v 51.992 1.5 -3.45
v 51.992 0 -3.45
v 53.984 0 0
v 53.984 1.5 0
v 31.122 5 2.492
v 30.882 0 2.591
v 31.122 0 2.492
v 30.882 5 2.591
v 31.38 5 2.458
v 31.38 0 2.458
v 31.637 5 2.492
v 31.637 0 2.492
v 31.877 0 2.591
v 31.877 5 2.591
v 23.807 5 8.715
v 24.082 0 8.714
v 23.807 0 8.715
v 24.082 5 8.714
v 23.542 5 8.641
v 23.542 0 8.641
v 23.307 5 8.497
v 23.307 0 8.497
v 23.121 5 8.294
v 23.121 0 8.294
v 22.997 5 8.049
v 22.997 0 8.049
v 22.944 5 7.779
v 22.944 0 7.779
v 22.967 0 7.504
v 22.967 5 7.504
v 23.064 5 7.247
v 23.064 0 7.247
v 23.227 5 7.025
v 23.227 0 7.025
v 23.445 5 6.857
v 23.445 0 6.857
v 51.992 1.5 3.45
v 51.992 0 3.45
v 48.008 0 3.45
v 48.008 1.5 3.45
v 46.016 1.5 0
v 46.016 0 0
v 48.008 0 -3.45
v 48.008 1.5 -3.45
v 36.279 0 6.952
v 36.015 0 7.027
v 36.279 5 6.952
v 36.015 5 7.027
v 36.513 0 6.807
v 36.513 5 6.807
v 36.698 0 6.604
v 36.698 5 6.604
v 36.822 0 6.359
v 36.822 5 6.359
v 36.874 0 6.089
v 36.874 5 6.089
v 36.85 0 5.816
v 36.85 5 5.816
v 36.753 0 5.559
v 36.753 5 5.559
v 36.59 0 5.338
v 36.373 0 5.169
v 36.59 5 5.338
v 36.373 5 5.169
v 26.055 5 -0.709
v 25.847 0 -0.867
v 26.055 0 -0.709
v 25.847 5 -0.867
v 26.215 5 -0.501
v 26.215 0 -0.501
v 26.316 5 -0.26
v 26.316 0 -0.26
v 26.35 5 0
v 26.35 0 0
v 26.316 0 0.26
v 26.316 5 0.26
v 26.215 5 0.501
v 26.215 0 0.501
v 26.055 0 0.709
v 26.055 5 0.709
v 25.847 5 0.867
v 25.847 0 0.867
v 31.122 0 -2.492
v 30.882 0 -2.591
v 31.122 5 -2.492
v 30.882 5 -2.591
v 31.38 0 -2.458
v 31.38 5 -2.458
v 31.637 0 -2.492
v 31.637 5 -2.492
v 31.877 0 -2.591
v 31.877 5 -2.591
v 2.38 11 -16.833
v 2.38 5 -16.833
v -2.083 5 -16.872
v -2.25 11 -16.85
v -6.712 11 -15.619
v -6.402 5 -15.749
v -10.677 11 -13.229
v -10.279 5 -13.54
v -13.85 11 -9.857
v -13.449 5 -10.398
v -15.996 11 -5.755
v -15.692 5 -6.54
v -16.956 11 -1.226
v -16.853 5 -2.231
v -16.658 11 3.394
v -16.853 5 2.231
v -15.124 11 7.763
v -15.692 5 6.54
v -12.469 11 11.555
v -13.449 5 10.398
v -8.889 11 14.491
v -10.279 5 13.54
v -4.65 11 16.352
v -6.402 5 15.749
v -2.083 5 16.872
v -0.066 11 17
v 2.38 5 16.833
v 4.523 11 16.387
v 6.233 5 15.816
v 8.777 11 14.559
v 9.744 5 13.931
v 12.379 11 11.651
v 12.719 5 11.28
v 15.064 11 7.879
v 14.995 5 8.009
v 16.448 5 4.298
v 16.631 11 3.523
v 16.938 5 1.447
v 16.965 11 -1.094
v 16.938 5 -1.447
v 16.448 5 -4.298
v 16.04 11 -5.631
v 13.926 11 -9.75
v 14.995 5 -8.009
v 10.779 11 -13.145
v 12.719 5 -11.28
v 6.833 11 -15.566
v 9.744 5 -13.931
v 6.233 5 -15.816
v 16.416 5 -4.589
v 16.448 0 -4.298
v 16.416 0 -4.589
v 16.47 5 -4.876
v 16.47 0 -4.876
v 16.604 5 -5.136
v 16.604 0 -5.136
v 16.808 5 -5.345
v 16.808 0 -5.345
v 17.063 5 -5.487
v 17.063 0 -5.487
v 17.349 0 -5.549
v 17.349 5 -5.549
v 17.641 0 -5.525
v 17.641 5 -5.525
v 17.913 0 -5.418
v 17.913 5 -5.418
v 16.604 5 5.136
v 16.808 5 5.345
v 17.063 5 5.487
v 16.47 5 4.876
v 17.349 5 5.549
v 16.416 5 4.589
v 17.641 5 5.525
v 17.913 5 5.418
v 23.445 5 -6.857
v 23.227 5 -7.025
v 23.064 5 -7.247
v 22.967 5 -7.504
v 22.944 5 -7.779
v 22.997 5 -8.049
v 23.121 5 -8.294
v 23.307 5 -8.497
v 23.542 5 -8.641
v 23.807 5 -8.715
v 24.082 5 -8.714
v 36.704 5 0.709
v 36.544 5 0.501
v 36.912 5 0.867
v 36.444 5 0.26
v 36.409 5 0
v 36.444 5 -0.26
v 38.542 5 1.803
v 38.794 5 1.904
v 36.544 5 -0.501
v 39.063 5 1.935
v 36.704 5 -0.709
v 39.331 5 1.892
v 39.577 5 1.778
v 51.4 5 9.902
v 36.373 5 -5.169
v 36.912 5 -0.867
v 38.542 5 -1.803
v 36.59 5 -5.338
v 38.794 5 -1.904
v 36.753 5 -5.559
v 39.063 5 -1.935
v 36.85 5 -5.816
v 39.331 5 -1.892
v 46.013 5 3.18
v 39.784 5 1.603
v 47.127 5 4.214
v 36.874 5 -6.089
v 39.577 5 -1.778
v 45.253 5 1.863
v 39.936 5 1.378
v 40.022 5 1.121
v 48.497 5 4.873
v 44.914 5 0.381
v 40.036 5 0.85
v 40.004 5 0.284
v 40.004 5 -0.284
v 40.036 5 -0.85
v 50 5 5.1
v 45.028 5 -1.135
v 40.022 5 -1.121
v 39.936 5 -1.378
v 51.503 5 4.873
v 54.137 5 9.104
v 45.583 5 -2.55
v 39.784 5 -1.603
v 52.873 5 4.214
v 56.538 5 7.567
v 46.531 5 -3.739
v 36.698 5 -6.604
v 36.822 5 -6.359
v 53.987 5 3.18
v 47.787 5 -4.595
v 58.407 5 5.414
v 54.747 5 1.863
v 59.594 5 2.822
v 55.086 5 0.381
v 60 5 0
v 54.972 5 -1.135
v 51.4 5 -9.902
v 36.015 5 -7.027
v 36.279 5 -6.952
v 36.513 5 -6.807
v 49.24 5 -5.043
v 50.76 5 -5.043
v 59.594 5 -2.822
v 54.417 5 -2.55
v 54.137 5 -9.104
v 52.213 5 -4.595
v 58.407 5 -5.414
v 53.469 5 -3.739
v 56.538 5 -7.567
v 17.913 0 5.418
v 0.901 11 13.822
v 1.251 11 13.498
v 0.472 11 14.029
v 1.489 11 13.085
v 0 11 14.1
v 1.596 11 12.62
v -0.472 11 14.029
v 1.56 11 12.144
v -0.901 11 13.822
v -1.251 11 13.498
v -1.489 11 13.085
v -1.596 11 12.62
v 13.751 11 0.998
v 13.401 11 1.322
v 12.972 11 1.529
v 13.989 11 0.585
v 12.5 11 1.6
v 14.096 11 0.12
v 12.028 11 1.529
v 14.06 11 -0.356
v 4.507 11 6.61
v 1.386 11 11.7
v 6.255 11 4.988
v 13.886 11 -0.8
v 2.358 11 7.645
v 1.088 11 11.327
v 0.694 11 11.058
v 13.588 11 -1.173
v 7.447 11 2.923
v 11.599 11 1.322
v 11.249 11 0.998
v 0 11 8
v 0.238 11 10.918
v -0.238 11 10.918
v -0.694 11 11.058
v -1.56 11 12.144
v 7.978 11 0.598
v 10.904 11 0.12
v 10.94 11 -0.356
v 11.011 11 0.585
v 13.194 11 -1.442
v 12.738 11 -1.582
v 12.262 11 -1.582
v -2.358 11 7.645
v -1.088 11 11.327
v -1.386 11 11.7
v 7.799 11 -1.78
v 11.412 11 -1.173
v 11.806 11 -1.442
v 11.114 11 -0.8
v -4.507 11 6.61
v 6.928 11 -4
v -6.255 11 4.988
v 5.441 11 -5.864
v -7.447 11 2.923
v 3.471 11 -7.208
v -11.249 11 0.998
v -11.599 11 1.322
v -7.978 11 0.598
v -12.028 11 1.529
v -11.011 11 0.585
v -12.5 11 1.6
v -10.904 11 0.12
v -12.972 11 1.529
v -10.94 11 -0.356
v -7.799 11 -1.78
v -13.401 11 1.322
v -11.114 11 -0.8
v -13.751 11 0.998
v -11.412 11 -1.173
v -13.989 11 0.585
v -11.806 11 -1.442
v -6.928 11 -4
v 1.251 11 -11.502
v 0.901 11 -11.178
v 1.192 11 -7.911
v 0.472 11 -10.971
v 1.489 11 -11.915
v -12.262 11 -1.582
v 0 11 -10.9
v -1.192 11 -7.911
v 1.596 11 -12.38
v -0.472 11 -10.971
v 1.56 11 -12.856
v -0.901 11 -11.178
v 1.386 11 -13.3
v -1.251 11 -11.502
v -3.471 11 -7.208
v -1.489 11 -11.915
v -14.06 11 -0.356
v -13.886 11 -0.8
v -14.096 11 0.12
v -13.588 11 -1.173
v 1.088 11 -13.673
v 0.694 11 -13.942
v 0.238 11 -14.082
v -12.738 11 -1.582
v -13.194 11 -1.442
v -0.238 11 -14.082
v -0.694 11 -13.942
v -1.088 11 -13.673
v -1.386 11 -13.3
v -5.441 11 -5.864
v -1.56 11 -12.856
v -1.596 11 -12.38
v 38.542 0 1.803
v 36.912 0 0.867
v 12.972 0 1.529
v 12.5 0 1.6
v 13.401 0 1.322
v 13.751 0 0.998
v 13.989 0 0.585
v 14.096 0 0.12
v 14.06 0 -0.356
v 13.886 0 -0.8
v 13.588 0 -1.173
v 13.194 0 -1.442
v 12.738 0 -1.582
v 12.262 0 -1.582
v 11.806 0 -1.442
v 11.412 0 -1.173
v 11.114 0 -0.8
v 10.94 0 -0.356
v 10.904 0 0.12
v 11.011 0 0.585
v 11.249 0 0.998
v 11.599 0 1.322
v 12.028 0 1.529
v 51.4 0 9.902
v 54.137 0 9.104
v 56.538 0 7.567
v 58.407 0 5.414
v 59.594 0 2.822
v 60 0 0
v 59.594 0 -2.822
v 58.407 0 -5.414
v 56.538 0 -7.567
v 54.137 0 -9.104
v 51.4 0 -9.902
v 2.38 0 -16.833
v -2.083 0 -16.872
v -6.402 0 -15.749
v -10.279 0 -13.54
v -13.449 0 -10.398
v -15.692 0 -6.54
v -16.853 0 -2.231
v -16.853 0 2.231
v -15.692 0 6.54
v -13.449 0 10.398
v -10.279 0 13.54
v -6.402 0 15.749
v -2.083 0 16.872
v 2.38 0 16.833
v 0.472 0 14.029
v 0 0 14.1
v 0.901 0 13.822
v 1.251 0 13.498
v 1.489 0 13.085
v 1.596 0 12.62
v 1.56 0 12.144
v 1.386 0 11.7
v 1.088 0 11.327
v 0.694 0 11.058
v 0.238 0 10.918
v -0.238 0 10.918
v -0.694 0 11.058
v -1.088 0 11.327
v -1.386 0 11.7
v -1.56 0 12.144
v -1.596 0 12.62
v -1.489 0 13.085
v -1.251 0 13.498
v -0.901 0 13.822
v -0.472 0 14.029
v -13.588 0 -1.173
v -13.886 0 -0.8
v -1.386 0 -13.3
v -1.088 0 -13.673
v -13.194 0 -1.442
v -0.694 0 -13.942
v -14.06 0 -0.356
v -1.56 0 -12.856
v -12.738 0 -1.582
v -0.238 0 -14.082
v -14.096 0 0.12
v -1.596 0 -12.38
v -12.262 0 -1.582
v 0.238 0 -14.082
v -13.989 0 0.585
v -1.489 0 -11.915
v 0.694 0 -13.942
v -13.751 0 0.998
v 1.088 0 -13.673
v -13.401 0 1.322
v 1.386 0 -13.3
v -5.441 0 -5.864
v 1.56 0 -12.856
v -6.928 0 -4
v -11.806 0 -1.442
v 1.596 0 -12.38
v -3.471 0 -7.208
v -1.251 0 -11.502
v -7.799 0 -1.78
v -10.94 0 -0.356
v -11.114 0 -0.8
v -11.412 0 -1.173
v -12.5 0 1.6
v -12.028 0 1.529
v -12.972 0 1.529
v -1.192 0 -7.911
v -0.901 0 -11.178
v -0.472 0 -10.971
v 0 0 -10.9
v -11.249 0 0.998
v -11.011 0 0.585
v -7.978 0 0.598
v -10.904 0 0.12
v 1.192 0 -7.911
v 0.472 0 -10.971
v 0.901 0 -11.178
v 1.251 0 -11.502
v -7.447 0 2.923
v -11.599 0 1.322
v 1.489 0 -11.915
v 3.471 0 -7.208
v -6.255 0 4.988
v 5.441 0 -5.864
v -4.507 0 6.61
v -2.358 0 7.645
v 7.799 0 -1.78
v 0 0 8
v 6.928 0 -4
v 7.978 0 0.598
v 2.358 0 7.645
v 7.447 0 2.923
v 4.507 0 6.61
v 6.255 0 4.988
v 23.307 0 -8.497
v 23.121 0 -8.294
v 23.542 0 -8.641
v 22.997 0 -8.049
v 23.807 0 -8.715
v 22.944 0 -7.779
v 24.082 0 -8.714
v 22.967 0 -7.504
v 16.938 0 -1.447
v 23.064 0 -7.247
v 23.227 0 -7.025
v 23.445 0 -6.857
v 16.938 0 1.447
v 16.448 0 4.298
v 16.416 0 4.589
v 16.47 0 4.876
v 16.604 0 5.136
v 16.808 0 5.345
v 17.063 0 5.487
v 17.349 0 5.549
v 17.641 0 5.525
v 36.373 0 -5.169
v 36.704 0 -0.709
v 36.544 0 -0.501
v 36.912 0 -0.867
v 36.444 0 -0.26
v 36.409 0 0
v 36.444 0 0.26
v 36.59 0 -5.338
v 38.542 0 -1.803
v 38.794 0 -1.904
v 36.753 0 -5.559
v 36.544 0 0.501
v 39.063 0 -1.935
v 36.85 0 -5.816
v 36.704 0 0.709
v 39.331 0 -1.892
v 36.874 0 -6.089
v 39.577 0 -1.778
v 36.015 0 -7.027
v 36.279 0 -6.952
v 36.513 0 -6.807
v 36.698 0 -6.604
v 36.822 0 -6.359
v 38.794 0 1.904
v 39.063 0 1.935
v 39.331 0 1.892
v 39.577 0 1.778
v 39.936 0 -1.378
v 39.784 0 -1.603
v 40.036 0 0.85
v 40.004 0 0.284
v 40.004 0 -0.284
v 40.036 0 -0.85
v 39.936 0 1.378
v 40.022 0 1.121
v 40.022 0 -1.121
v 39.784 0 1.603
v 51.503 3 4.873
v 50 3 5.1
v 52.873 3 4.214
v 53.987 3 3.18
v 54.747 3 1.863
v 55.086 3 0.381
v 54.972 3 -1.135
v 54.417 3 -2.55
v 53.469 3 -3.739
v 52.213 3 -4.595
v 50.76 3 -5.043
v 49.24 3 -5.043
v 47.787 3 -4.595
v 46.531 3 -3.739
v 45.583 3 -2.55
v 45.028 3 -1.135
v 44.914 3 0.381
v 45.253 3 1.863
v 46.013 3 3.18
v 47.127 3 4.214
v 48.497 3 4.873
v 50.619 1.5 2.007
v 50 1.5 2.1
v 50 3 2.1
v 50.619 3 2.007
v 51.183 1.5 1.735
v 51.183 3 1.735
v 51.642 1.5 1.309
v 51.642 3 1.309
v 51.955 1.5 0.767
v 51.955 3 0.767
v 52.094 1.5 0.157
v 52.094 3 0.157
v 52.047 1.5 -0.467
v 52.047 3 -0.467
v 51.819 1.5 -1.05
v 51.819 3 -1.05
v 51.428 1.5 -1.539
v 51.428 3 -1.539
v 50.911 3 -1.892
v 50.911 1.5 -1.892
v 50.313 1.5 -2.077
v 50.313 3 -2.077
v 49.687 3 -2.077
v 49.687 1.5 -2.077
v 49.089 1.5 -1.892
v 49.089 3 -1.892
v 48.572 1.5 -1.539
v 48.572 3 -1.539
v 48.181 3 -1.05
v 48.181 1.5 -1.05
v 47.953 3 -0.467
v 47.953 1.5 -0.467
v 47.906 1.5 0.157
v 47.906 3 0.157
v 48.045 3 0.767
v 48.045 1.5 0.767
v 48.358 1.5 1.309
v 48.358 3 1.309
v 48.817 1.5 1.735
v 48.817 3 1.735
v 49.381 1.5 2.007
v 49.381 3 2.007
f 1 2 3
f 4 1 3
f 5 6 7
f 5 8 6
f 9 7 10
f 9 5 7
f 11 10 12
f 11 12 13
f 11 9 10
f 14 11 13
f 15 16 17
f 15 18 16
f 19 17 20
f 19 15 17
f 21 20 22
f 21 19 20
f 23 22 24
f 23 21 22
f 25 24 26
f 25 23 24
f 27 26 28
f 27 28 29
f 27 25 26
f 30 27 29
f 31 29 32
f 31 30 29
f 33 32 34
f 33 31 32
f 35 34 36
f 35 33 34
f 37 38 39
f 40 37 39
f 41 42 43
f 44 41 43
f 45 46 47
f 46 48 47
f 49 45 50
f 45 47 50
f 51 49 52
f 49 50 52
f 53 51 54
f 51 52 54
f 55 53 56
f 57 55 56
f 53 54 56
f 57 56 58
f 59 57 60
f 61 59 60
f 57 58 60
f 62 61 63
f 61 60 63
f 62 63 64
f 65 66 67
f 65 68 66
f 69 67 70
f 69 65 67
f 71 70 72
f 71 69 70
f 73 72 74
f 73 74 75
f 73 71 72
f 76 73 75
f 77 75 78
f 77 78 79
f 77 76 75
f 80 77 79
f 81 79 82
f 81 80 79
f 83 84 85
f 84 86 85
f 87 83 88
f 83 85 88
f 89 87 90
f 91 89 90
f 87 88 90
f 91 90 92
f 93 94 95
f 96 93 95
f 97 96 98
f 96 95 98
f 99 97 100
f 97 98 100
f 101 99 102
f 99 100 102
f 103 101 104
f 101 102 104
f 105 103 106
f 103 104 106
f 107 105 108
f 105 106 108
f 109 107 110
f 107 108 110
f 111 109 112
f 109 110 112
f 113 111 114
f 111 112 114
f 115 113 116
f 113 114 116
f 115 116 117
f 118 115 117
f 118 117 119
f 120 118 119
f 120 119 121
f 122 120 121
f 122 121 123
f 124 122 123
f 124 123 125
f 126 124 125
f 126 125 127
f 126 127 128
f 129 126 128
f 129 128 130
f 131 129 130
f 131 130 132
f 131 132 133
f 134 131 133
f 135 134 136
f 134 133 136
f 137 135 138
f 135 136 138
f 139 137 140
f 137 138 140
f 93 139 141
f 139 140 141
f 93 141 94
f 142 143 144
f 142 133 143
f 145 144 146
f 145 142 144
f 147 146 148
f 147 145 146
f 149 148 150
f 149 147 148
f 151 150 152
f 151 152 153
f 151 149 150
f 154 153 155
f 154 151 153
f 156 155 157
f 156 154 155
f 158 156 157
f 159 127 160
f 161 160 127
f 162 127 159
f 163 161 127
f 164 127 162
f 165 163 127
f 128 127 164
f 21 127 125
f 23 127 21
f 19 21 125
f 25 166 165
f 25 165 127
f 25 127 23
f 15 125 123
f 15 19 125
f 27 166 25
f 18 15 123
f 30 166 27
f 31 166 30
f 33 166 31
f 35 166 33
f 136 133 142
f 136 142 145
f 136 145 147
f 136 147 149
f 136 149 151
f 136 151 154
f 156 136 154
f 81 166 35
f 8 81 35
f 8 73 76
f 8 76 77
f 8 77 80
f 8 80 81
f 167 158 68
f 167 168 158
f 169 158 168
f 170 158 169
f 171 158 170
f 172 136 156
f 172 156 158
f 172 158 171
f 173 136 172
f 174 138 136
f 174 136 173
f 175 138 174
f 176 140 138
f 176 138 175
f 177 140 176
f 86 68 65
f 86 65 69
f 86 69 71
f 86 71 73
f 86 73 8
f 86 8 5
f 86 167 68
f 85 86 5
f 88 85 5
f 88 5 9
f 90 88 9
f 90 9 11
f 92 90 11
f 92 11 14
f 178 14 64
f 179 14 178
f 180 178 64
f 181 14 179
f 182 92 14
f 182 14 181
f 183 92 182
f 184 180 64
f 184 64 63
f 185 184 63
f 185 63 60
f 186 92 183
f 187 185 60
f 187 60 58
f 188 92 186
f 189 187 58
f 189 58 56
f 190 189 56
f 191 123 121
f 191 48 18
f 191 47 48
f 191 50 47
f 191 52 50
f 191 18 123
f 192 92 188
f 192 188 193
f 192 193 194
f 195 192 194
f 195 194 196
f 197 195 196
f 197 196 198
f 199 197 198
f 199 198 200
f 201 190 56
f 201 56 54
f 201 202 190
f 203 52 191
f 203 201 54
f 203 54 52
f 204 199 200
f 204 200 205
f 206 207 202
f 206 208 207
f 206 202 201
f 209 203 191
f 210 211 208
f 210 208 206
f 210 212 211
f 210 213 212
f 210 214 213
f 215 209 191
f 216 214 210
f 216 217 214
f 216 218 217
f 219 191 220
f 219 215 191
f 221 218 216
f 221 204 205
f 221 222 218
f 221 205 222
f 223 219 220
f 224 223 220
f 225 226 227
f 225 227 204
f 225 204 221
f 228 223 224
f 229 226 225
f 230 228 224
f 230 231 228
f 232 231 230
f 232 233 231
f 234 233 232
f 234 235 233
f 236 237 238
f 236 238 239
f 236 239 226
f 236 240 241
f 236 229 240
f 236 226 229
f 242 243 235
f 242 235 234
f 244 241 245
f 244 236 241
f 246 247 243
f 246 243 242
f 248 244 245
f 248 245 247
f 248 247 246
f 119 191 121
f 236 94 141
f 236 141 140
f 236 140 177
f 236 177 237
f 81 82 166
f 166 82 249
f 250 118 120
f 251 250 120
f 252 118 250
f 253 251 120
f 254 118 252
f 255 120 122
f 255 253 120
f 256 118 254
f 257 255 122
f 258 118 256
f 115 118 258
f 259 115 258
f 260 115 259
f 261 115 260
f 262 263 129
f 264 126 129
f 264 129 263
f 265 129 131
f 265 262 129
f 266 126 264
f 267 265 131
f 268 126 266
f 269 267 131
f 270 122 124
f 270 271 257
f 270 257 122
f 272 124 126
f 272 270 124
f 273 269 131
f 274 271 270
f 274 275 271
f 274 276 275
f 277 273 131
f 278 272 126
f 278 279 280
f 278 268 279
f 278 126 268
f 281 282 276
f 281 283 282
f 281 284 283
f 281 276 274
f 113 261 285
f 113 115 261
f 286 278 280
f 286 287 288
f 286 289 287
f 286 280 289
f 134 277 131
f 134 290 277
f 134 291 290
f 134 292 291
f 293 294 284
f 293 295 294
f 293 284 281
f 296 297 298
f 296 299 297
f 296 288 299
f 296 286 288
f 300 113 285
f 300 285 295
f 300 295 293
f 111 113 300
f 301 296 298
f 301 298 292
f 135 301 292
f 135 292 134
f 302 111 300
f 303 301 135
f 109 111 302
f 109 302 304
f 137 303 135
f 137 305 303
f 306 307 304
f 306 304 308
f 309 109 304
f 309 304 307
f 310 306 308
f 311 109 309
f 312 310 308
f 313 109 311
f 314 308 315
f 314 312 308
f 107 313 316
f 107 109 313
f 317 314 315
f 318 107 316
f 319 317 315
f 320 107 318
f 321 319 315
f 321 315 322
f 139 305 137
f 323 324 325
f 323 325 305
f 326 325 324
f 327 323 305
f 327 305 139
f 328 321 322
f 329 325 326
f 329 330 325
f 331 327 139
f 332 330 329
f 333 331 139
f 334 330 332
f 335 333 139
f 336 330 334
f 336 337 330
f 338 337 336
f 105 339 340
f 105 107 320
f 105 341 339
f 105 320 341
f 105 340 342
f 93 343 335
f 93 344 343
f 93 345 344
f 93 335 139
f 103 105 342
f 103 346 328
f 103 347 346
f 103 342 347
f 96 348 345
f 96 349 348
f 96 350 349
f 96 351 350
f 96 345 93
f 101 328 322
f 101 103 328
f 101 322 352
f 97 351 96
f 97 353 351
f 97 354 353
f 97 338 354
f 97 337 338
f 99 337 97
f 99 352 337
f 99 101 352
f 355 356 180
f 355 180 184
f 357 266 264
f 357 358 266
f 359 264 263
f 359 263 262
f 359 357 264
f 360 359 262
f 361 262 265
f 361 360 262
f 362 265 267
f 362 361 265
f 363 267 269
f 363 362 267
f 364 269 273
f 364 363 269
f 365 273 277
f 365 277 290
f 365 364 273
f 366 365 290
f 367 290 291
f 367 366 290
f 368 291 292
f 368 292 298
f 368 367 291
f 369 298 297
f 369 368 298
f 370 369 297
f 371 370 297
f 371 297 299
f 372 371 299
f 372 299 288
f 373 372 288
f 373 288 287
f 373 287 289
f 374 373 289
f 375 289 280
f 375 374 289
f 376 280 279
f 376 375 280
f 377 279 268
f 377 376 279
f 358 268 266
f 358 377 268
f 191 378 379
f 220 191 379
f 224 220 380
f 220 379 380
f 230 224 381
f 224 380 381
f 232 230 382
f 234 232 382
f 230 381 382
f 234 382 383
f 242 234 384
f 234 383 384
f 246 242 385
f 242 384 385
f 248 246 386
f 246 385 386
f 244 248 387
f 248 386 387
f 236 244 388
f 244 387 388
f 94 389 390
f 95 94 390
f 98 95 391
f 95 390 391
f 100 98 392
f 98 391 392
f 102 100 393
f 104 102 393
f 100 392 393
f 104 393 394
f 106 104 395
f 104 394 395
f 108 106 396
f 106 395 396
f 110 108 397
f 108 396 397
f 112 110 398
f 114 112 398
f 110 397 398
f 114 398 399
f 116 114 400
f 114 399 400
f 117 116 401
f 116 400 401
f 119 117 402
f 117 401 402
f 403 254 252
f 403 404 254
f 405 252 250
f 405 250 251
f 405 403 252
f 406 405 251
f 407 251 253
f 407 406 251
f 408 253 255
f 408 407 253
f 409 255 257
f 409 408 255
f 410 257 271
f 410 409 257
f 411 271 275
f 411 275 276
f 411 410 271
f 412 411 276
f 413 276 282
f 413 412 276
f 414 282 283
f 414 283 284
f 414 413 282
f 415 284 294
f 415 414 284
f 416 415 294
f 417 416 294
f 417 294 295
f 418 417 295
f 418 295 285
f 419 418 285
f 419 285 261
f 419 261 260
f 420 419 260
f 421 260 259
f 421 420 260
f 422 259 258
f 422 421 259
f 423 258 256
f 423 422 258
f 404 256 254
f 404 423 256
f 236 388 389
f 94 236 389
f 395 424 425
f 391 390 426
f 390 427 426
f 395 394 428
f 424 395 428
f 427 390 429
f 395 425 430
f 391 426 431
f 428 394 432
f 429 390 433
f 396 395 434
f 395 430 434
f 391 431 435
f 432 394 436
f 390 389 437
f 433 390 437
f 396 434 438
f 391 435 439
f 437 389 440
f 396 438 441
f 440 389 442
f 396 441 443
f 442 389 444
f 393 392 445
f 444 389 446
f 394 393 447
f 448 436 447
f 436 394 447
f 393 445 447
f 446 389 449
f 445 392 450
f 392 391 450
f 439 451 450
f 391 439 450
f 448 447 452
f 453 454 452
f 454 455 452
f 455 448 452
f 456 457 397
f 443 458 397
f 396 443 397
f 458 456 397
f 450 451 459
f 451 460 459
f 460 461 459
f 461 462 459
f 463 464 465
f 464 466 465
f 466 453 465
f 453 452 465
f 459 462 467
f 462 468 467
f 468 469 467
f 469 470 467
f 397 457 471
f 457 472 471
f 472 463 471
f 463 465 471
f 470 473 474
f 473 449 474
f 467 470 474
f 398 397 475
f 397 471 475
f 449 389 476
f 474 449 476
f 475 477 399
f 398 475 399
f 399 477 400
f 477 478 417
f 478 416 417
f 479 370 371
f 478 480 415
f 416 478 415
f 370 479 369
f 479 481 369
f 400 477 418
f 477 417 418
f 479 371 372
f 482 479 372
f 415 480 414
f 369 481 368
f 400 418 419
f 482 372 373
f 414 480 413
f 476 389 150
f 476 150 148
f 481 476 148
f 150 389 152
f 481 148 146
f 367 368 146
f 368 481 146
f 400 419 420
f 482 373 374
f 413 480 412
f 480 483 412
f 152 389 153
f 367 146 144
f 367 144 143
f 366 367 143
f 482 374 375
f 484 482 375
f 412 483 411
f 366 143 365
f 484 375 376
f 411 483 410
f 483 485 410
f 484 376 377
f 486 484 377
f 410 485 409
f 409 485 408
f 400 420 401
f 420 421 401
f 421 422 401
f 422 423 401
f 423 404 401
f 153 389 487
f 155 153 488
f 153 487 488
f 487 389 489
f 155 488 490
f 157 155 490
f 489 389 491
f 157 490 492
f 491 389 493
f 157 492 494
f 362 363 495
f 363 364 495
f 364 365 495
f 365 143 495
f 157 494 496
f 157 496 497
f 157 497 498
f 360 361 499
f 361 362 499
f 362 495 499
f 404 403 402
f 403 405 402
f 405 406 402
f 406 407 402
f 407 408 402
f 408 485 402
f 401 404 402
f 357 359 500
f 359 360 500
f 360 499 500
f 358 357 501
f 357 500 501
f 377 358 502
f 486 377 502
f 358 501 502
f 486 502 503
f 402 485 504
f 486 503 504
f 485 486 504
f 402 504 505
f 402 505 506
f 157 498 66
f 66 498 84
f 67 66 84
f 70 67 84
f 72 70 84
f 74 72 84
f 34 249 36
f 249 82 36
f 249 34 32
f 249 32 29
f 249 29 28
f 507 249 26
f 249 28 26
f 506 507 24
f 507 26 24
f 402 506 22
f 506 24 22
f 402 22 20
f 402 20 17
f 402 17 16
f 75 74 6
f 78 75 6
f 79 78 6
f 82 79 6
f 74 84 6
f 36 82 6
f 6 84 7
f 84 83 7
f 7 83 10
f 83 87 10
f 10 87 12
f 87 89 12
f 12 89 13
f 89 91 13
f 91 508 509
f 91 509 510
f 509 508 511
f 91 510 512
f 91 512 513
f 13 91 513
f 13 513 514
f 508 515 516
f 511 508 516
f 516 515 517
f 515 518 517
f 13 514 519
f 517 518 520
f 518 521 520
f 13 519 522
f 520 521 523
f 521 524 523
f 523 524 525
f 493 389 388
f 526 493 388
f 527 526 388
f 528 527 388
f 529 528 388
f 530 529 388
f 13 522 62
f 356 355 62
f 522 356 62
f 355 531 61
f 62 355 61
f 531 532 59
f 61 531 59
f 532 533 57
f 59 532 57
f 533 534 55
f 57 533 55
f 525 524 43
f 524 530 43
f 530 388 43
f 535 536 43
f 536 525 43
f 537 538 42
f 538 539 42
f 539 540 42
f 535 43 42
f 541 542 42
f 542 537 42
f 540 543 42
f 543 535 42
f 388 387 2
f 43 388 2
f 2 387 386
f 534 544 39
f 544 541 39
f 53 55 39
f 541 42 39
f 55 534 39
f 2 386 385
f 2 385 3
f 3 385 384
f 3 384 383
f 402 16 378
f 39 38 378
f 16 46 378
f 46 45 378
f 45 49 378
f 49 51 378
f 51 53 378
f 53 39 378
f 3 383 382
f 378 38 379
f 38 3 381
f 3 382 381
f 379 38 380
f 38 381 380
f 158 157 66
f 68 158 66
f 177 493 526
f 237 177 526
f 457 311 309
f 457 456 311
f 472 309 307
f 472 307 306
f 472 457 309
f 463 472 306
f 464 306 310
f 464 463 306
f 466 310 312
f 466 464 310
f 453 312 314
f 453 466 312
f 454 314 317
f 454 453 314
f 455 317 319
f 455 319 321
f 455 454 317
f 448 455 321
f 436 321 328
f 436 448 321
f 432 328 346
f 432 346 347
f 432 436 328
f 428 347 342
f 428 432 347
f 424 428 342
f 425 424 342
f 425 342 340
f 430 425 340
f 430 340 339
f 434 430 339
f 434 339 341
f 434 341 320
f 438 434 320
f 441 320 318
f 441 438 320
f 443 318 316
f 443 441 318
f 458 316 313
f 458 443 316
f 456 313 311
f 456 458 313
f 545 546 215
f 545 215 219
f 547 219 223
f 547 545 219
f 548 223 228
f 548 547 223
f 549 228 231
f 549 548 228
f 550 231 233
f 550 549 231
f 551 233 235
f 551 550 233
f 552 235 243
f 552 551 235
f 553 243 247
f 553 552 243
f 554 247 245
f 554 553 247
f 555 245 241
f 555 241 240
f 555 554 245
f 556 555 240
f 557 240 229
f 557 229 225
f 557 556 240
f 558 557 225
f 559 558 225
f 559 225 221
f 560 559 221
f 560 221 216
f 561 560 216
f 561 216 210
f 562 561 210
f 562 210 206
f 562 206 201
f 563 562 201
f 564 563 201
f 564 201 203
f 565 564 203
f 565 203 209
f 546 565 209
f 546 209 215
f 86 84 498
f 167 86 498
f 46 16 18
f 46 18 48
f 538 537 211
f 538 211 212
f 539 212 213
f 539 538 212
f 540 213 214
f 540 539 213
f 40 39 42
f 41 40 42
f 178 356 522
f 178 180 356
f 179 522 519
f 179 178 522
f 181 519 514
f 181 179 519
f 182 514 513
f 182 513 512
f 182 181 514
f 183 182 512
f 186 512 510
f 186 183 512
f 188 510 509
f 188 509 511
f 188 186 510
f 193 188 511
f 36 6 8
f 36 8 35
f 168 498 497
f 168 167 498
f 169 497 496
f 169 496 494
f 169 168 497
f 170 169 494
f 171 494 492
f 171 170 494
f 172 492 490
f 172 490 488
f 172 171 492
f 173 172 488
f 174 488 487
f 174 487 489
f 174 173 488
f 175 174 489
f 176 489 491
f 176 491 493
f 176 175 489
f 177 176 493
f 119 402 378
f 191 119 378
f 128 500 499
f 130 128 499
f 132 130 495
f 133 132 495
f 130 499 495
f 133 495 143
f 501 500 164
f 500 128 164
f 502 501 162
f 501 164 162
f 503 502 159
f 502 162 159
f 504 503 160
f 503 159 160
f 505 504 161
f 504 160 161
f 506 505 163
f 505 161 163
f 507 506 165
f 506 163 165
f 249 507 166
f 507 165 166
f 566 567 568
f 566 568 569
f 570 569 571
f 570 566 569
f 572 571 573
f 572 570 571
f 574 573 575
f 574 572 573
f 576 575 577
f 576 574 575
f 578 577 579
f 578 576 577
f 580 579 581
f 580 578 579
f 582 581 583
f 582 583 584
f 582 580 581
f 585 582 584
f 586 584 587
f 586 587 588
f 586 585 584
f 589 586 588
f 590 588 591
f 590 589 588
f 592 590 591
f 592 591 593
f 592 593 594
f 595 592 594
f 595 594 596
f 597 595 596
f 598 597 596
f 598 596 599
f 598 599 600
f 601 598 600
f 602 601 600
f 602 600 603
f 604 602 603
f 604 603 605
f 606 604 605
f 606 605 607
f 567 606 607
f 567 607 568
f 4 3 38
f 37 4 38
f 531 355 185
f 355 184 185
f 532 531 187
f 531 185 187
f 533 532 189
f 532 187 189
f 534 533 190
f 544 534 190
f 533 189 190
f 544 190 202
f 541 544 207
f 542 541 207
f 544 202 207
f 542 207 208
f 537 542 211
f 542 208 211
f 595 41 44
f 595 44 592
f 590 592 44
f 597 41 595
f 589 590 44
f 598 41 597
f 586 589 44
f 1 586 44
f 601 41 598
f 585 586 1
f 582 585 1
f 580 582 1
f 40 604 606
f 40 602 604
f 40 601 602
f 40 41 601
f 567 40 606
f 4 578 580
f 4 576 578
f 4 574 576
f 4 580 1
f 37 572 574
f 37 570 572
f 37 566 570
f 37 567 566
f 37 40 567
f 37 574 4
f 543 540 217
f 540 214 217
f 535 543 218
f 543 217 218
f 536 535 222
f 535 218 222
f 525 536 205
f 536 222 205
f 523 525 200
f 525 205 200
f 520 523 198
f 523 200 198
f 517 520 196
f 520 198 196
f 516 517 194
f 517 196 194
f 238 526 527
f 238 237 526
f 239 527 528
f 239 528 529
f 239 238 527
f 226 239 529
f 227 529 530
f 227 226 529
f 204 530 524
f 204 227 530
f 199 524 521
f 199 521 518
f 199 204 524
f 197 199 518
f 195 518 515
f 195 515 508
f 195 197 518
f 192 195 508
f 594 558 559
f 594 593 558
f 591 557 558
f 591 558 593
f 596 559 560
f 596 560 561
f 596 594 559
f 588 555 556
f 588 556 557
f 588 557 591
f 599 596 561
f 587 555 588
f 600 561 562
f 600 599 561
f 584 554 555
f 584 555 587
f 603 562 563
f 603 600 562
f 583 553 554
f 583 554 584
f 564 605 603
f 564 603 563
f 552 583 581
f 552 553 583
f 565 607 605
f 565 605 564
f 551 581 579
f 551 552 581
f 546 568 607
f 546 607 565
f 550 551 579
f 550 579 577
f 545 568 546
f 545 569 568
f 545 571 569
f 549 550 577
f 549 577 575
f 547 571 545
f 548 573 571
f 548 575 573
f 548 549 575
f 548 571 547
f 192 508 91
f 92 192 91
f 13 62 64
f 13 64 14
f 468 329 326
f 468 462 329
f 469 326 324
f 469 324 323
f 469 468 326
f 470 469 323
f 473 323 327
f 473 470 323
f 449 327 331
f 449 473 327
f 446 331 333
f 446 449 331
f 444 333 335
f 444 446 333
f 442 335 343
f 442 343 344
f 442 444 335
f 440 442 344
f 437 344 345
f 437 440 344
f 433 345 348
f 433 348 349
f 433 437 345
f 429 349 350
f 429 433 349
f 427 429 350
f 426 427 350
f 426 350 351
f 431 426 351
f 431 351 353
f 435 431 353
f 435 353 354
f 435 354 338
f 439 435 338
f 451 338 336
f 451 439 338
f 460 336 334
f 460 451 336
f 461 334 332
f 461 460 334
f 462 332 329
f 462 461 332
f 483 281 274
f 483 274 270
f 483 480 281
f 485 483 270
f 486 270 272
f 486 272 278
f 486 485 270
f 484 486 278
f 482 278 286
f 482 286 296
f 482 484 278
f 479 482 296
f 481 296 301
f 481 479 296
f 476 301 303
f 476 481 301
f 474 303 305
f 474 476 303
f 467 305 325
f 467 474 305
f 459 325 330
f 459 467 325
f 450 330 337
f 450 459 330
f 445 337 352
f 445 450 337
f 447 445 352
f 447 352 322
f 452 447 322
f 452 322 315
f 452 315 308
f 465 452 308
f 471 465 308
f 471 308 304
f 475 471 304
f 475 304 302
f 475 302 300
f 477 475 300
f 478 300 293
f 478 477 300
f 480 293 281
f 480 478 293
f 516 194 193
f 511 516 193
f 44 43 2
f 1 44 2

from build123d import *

# Parameters (mm, degrees)
SKETCH_1_R          = 1.6
SKETCH_1_R_2        = 8
SKETCH_1_R_3        = 5.1
EXTRUDE_1_DEPTH     = 5
SKETCH_1_3_R        = 5.1
SKETCH_1_3_R_2      = 2.1
EXTRUDE_2_DEPTH     = 3
FILLET_1_R          = 1
FILLET_2_R          = 1
FILLET_3_R          = 1
FILLET_4_R          = 1
CUT_EXTRUDE_1_DEPTH = 1.5
SKETCH_3_R          = 17
SKETCH_3_R_2        = 8
SKETCH_3_R_3        = 1.6
EXTRUDE_4_DEPTH     = 6


with BuildPart() as part:
    # 草图1 → 凸台-拉伸1 (new body)
    with BuildSketch(Plane(origin=(0, 0, 0), x_dir=(1, 0, 0), z_dir=(0, 1, 0))):
        with BuildLine():
            ThreePointArc((2.38, 16.832575561), (-17, 0), (2.38, -16.832575561))
            Line((2.38, -16.832575561), (51.4, -9.901515036))
            ThreePointArc((51.4, -9.901515036), (60, 0), (51.4, 9.901515036))
            Line((51.4, 9.901515036), (2.38, 16.832575561))
        make_face()
        with Locations((0, -12.5)):
            Circle(SKETCH_1_R, mode=Mode.SUBTRACT)
        Polygon((38.90018853, -6.619162403), (18.93798634, -9.441668148), (31.379588649, -2.305623307), align=None, mode=Mode.SUBTRACT)
        with Locations((-12.5, 0)):
            Circle(SKETCH_1_R, mode=Mode.SUBTRACT)
        Circle(SKETCH_1_R_2, mode=Mode.SUBTRACT)
        with Locations((12.5, 0)):
            Circle(SKETCH_1_R, mode=Mode.SUBTRACT)
        with BuildLine():
            ThreePointArc((15.606195444, -6.741414077), (17, 0), (15.606195444, 6.741414077))
            Line((15.606195444, 6.741414077), (27.359764097, 0))
            Line((27.359764097, 0), (15.606195444, -6.741414077))
        make_face(mode=Mode.SUBTRACT)
        with Locations((0, 12.5)):
            Circle(SKETCH_1_R, mode=Mode.SUBTRACT)
        with BuildLine():
            Line((40.424329865, -2.882107123), (35.399413201, 0))
            Line((35.399413201, 0), (40.424329865, 2.882107123))
            ThreePointArc((40.424329865, 2.882107123), (40, 0), (40.424329865, -2.882107123))
        make_face(mode=Mode.SUBTRACT)
        Polygon((31.379588649, 2.305623307), (18.93798634, 9.441668148), (38.90018853, 6.619162403), align=None, mode=Mode.SUBTRACT)
        with Locations((50, 0)):
            Circle(SKETCH_1_R_3, mode=Mode.SUBTRACT)
    extrude(amount=EXTRUDE_1_DEPTH)

    # 草图1<3> → 凸台-拉伸2 (add)
    with BuildSketch(Plane(origin=(0, 0, 0), x_dir=(1, 0, 0), z_dir=(0, 1, 0))):
        with Locations((50, 0)):
            Circle(SKETCH_1_3_R)
        with Locations((50, 0)):
            Circle(SKETCH_1_3_R_2, mode=Mode.SUBTRACT)
    extrude(amount=EXTRUDE_2_DEPTH)

    # 圆角1
    fillet_1_edges = [part.edges().sort_by_distance(p)[0] for p in [
        (35.399413201, 2.5, 0),
        (40.424329865, 2.5, -2.882107123),
        (40.424329865, 2.5, 2.882107123),
    ]]
    fillet(fillet_1_edges, radius=FILLET_1_R)

    # 圆角2
    fillet_2_edges = [part.edges().sort_by_distance(p)[0] for p in [
        (31.379588649, 2.5, 2.305623307),
        (18.93798634, 2.5, 9.441668148),
        (38.90018853, 2.5, 6.619162403),
    ]]
    fillet(fillet_2_edges, radius=FILLET_2_R)

    # 圆角3
    fillet_3_edges = [part.edges().sort_by_distance(p)[0] for p in [
        (18.93798634, 2.5, -9.441668148),
        (31.379588649, 2.5, -2.305623307),
        (38.90018853, 2.5, -6.619162403),
    ]]
    fillet(fillet_3_edges, radius=FILLET_3_R)

    # 圆角4
    fillet_4_edges = [part.edges().sort_by_distance(p)[0] for p in [
        (15.606195444, 2.5, -6.741414077),
        (27.359764097, 2.5, 0),
        (15.606195444, 2.5, 6.741414077),
    ]]
    fillet(fillet_4_edges, radius=FILLET_4_R)

    # 草图2 → 切除-拉伸1 (cut)
    with BuildSketch(Plane.XZ):
        Polygon((53.983716857, 0), (51.991858429, 3.45), (48.008141571, 3.45), (46.016283143, 0), (48.008141571, -3.45), (51.991858429, -3.45), align=None)
    extrude(amount=-CUT_EXTRUDE_1_DEPTH, mode=Mode.SUBTRACT)

    # 草图3 → 凸台-拉伸4 (add)
    with BuildSketch(Plane(origin=(0, 5, 0), x_dir=(1, 0, 0), z_dir=(0, 1, 0))):
        Circle(SKETCH_3_R)
        Circle(SKETCH_3_R_2, mode=Mode.SUBTRACT)
        with Locations((0, -12.5)):
            Circle(SKETCH_3_R_3, mode=Mode.SUBTRACT)
        with Locations((12.5, 0)):
            Circle(SKETCH_3_R_3, mode=Mode.SUBTRACT)
        with Locations((0, 12.5)):
            Circle(SKETCH_3_R_3, mode=Mode.SUBTRACT)
        with Locations((-12.5, 0)):
            Circle(SKETCH_3_R_3, mode=Mode.SUBTRACT)
    extrude(amount=EXTRUDE_4_DEPTH)


solid = part.part
